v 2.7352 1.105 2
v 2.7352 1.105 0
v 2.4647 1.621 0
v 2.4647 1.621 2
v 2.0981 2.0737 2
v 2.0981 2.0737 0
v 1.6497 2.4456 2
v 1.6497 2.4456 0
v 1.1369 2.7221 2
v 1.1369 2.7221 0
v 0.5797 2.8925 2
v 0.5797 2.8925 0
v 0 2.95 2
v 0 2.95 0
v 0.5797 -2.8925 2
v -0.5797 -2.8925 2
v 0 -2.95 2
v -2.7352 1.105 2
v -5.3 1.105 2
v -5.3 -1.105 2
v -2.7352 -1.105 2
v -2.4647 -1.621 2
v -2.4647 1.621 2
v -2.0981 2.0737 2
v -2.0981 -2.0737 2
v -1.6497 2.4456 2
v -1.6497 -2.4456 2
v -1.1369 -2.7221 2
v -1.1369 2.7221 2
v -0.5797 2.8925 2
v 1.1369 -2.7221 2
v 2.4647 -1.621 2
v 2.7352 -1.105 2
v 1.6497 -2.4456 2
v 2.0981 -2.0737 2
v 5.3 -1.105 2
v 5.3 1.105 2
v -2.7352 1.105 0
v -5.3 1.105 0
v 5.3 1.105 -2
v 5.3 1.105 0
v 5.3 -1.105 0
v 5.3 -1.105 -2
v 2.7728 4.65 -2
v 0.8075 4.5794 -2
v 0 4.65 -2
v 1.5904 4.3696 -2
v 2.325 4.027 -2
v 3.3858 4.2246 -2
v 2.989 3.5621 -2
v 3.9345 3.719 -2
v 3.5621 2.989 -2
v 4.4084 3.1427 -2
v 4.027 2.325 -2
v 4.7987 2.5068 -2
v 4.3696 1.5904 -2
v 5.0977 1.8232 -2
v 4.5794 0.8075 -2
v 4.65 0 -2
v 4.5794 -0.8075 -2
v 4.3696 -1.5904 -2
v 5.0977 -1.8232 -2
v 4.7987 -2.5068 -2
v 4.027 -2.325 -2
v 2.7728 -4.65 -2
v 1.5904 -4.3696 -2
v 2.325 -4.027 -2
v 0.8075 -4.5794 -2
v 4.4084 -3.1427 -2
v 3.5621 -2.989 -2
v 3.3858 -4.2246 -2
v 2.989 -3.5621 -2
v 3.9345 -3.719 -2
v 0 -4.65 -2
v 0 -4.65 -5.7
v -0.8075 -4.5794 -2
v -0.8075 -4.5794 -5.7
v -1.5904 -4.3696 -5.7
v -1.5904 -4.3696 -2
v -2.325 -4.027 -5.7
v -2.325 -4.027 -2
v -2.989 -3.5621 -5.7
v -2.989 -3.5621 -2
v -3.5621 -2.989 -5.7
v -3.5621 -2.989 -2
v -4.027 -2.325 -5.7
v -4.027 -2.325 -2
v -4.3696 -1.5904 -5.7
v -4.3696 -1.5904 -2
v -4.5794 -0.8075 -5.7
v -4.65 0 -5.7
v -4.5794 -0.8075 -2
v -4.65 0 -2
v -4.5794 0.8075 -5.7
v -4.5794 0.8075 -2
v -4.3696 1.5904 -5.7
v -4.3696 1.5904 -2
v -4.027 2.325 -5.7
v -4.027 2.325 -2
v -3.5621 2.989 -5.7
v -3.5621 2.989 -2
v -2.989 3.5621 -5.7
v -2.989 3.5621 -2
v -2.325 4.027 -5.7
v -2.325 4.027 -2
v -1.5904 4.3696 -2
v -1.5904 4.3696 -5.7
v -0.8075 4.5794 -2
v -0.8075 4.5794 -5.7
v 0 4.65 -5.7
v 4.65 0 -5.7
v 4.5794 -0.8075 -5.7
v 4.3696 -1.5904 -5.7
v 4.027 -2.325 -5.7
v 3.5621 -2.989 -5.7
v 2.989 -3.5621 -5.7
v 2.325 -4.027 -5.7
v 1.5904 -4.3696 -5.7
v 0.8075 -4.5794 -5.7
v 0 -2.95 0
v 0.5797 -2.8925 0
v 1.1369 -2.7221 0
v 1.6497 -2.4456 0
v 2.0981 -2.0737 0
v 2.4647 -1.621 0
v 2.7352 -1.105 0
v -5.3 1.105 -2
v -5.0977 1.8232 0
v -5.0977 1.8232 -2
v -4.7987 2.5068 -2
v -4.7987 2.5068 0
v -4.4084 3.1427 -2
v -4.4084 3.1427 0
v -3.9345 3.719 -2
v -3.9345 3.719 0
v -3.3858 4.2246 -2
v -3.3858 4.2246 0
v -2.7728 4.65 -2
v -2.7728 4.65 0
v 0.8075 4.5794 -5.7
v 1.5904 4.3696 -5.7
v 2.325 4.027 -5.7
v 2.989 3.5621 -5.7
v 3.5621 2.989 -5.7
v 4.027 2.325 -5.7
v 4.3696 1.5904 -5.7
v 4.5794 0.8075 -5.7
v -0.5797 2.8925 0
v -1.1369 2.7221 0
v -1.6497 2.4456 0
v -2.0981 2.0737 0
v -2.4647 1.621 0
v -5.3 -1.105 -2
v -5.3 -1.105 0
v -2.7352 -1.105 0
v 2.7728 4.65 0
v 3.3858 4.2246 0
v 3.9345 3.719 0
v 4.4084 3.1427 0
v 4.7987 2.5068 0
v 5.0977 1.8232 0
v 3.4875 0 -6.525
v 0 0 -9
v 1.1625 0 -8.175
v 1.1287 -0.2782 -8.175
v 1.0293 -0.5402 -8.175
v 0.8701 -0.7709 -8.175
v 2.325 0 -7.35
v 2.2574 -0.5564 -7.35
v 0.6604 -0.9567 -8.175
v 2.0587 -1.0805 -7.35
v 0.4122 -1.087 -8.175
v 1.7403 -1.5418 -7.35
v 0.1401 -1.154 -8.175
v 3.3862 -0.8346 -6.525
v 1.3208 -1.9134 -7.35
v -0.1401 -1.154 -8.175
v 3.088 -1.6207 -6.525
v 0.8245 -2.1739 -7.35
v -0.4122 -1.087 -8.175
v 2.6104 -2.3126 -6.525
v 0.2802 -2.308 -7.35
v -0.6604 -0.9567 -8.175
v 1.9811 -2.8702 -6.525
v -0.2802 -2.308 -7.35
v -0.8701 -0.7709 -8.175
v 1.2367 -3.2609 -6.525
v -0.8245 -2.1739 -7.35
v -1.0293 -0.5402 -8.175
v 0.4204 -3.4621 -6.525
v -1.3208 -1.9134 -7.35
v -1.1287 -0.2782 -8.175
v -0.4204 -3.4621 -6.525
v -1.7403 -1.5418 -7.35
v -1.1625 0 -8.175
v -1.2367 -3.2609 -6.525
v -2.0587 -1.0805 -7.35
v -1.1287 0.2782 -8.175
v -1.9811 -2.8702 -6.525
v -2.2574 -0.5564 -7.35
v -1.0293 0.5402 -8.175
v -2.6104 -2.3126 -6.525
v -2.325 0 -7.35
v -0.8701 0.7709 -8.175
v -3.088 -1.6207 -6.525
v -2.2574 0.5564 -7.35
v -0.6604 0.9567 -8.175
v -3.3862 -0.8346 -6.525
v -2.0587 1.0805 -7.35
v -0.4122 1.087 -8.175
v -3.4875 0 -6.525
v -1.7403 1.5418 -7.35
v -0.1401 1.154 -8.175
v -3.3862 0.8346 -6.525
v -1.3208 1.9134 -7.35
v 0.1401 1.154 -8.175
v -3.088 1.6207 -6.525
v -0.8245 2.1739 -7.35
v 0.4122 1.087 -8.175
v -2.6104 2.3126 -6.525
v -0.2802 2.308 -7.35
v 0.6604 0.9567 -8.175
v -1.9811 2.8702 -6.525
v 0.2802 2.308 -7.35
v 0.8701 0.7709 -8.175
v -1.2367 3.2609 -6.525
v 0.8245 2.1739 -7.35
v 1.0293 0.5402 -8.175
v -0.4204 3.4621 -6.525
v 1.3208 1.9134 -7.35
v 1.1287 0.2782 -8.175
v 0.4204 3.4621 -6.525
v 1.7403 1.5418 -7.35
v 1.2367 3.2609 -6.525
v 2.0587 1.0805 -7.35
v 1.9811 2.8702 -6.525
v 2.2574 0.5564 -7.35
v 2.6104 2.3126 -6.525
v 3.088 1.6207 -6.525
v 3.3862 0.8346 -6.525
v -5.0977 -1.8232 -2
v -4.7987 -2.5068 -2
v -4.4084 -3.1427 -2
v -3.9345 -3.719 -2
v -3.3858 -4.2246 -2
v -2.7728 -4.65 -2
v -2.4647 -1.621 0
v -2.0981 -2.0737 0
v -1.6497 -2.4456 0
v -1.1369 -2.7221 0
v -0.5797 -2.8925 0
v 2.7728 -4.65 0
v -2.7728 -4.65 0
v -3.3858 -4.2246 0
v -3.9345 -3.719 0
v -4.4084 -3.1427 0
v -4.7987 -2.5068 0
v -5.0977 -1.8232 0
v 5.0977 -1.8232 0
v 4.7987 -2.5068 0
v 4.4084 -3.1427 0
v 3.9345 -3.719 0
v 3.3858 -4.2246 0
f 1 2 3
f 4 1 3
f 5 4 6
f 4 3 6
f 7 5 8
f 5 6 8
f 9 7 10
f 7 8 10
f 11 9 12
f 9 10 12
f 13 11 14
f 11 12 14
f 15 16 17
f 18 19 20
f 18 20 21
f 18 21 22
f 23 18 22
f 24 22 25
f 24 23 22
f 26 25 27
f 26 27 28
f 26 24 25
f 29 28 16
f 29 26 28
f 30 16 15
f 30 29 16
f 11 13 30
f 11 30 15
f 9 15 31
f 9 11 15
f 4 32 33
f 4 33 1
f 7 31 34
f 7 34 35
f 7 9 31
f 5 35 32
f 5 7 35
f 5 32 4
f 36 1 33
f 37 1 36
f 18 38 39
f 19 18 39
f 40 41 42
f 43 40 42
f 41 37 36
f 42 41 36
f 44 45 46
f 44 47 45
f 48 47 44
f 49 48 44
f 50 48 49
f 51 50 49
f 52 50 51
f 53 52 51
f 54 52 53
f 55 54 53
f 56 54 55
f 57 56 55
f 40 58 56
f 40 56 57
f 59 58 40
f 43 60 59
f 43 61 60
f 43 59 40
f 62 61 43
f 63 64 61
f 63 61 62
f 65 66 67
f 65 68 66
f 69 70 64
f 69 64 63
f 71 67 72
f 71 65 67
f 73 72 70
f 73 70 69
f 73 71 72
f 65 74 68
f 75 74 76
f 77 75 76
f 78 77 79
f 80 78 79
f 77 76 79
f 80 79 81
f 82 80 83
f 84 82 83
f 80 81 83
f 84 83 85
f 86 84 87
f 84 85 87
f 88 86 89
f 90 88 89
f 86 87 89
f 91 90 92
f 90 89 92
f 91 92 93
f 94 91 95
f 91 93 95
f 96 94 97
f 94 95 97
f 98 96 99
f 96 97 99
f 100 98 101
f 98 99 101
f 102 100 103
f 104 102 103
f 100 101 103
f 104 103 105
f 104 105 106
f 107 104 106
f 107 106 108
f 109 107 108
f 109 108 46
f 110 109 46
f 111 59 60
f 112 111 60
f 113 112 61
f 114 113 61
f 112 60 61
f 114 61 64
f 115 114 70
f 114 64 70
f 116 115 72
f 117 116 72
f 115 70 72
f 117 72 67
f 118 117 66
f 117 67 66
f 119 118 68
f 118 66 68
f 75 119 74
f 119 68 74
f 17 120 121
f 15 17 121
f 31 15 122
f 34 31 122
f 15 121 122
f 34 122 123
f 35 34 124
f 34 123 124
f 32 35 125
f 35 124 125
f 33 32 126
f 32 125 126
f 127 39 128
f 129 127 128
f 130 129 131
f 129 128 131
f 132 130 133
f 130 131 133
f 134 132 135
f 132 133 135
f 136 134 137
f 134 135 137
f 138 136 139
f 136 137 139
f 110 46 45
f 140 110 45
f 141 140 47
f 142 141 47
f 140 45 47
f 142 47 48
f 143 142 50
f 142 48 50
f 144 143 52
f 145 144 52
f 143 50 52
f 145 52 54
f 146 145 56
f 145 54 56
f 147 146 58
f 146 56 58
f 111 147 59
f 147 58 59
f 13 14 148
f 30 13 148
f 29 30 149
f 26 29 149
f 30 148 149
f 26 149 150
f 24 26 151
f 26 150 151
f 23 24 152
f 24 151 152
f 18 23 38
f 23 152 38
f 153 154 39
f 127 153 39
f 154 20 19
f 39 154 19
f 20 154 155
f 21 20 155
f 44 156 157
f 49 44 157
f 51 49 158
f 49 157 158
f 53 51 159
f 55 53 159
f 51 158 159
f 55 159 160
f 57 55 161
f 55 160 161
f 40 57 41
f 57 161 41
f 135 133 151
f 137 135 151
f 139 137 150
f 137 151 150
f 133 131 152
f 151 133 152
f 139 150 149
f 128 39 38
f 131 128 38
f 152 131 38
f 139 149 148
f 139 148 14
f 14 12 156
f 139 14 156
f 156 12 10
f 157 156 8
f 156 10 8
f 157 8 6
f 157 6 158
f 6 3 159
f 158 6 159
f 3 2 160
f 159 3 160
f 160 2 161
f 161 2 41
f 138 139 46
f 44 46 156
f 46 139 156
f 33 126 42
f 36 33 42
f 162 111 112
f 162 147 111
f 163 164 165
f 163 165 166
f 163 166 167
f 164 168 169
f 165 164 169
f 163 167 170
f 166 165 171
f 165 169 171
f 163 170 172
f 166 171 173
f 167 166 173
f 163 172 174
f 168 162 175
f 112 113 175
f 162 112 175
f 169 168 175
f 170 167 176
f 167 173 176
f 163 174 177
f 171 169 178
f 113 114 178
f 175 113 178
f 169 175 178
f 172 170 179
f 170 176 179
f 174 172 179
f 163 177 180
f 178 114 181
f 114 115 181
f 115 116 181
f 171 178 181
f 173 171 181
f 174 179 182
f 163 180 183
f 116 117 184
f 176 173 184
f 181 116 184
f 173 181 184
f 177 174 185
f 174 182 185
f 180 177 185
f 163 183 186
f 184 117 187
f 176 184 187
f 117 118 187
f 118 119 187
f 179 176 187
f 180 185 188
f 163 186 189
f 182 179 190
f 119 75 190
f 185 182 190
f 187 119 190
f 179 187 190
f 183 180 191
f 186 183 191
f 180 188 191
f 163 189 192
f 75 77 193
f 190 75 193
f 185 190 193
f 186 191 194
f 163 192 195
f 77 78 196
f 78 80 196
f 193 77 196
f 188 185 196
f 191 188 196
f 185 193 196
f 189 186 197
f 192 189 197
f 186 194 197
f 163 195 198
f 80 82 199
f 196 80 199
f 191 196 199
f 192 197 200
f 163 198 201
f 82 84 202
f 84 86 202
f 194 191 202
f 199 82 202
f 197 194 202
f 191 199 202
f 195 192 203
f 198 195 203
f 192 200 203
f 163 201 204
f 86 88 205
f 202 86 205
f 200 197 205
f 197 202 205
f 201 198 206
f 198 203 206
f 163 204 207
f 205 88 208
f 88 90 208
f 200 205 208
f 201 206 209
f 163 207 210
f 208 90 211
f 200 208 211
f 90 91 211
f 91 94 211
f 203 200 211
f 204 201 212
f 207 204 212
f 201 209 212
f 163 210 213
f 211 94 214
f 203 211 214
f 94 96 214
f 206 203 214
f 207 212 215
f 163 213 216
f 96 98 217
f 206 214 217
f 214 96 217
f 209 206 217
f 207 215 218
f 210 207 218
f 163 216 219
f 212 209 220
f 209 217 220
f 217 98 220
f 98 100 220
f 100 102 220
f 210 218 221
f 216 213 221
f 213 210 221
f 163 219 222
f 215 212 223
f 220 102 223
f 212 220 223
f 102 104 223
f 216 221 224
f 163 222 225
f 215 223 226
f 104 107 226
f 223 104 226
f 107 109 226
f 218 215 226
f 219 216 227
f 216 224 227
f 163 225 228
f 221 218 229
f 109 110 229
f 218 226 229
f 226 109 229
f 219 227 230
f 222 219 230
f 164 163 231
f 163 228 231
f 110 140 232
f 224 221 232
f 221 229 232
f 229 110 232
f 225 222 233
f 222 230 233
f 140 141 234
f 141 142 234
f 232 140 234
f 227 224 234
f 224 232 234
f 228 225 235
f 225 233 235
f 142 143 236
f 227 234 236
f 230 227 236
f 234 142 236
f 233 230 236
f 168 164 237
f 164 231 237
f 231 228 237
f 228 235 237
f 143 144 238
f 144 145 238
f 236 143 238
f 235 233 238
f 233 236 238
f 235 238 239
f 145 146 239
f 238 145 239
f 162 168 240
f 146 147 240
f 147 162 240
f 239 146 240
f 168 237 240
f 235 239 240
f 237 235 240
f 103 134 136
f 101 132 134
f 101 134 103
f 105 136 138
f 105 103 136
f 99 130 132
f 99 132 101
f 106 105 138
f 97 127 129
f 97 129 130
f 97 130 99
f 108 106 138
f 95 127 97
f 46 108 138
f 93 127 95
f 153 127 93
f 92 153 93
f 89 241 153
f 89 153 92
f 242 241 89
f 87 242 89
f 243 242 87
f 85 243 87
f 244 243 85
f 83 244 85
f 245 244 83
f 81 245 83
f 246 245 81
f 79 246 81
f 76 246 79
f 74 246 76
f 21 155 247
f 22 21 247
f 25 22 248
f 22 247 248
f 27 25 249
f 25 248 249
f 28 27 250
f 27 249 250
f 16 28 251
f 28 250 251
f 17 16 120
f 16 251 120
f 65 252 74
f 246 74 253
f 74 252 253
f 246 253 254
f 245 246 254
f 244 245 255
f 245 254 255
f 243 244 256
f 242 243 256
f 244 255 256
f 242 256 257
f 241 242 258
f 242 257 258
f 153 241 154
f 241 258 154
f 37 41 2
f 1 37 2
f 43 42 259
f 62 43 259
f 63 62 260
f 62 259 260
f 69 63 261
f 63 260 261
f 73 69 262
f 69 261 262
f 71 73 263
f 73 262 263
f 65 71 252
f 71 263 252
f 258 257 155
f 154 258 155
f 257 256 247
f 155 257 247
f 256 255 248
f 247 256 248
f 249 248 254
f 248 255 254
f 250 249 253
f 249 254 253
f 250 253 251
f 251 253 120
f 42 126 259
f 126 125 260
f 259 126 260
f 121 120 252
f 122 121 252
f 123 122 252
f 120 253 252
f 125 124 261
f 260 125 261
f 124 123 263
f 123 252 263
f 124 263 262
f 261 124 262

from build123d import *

# Parameters (mm, degrees)
F1_DEPTH  = 2
F3_DEPTH  = 2
F5_DEPTH  = 3.7
F5_FACE_R = 4.65


with BuildPart() as f1:
    # F0 (on Top) → F1 (new body)
    with BuildSketch(Plane.XY):
        with BuildLine():
            Line((-4.516799, 1.105), (-5.3, 1.105))
            Line((-5.3, 1.105), (-5.3, -1.105))
            Line((-5.3, -1.105), (-4.516799, -1.105))
            ThreePointArc((-4.516799, -1.105), (-4.65, 0), (-4.516799, 1.105))
        make_face()
        with BuildLine():
            ThreePointArc((0, 2.95), (-1.649659, 2.445634), (-2.735229, 1.105))
            ThreePointArc((-2.735229, 1.105), (-2.895809, 0.562839), (-2.95, 0))
            ThreePointArc((-2.95, 0), (-2.895809, -0.562839), (-2.735229, -1.105))
            ThreePointArc((-2.735229, -1.105), (-1.649659, -2.445634), (0, -2.95))
            ThreePointArc((0, -2.95), (1.649659, -2.445634), (2.735229, -1.105))
            ThreePointArc((2.735229, -1.105), (2.895809, -0.562839), (2.95, 0))
            ThreePointArc((2.95, 0), (2.895809, 0.562839), (2.735229, 1.105))
            ThreePointArc((2.735229, 1.105), (1.649659, 2.445634), (0, 2.95))
        make_face()
        with BuildLine():
            Line((5.3, 1.105), (4.516799, 1.105))
            ThreePointArc((4.516799, 1.105), (4.61658, 0.5565), (4.65, 0))
            ThreePointArc((4.65, 0), (4.61658, -0.5565), (4.516799, -1.105))
            Line((4.516799, -1.105), (5.3, -1.105))
            Line((5.3, -1.105), (5.3, 1.105))
        make_face()
        with BuildLine():
            Line((-2.735229, 1.105), (-4.516799, 1.105))
            ThreePointArc((-4.516799, 1.105), (-4.65, 0), (-4.516799, -1.105))
            Line((-4.516799, -1.105), (-2.735229, -1.105))
            ThreePointArc((-2.735229, -1.105), (-2.895809, -0.562839), (-2.95, 0))
            ThreePointArc((-2.95, 0), (-2.895809, 0.562839), (-2.735229, 1.105))
        make_face()
        with BuildLine():
            ThreePointArc((4.65, 0), (4.61658, 0.5565), (4.516799, 1.105))
            Line((4.516799, 1.105), (2.735229, 1.105))
            ThreePointArc((2.735229, 1.105), (2.895809, 0.562839), (2.95, 0))
            ThreePointArc((2.95, 0), (2.895809, -0.562839), (2.735229, -1.105))
            Line((2.735229, -1.105), (4.516799, -1.105))
            ThreePointArc((4.516799, -1.105), (4.61658, -0.5565), (4.65, 0))
        make_face()
    extrude(amount=F1_DEPTH)

    # F2 (on face) → F3 (join)
    with BuildSketch(Plane(origin=(0, 0, 0), x_dir=(1, 0, 0), z_dir=(0, 0, -1))):
        with BuildLine():
            Line((-5.3, 1.105), (-5.3, -1.105))
            ThreePointArc((-5.3, -1.105), (-4.408442, -3.142717), (-2.772819, -4.65))
            Line((-2.772819, -4.65), (0, -4.65))
            Line((0, -4.65), (2.772819, -4.65))
            ThreePointArc((2.772819, -4.65), (4.408442, -3.142717), (5.3, -1.105))
            Line((5.3, -1.105), (5.3, 1.105))
            ThreePointArc((5.3, 1.105), (4.408442, 3.142717), (2.772819, 4.65))
            Line((2.772819, 4.65), (0, 4.65))
            Line((0, 4.65), (-2.772819, 4.65))
            ThreePointArc((-2.772819, 4.65), (-4.408442, 3.142717), (-5.3, 1.105))
        make_face()
    extrude(amount=F3_DEPTH)

    # F4 (on face) → F5 (join)
    with BuildSketch(Plane(origin=(0, 0, -2), x_dir=(1, 0, 0), z_dir=(0, 0, -1))):
        with BuildLine():
            ThreePointArc((0, -4.65), (3.288047, -3.288047), (4.65, 0))
            ThreePointArc((4.65, 0), (3.288047, 3.288047), (0, 4.65))
            ThreePointArc((0, 4.65), (-4.65, 0), (0, -4.65))
        make_face()
    extrude(amount=F5_DEPTH)

    # F5_face (on face) → F7 section 0
    with BuildSketch(Plane(origin=(0, 0, -5.7), x_dir=(1, 0, 0), z_dir=(0, 0, -1)), mode=Mode.PRIVATE) as f7_s0:
        Circle(F5_FACE_R)
    loft([Vertex(0, 0, -9), f7_s0.sketch])


solid = f1.part
